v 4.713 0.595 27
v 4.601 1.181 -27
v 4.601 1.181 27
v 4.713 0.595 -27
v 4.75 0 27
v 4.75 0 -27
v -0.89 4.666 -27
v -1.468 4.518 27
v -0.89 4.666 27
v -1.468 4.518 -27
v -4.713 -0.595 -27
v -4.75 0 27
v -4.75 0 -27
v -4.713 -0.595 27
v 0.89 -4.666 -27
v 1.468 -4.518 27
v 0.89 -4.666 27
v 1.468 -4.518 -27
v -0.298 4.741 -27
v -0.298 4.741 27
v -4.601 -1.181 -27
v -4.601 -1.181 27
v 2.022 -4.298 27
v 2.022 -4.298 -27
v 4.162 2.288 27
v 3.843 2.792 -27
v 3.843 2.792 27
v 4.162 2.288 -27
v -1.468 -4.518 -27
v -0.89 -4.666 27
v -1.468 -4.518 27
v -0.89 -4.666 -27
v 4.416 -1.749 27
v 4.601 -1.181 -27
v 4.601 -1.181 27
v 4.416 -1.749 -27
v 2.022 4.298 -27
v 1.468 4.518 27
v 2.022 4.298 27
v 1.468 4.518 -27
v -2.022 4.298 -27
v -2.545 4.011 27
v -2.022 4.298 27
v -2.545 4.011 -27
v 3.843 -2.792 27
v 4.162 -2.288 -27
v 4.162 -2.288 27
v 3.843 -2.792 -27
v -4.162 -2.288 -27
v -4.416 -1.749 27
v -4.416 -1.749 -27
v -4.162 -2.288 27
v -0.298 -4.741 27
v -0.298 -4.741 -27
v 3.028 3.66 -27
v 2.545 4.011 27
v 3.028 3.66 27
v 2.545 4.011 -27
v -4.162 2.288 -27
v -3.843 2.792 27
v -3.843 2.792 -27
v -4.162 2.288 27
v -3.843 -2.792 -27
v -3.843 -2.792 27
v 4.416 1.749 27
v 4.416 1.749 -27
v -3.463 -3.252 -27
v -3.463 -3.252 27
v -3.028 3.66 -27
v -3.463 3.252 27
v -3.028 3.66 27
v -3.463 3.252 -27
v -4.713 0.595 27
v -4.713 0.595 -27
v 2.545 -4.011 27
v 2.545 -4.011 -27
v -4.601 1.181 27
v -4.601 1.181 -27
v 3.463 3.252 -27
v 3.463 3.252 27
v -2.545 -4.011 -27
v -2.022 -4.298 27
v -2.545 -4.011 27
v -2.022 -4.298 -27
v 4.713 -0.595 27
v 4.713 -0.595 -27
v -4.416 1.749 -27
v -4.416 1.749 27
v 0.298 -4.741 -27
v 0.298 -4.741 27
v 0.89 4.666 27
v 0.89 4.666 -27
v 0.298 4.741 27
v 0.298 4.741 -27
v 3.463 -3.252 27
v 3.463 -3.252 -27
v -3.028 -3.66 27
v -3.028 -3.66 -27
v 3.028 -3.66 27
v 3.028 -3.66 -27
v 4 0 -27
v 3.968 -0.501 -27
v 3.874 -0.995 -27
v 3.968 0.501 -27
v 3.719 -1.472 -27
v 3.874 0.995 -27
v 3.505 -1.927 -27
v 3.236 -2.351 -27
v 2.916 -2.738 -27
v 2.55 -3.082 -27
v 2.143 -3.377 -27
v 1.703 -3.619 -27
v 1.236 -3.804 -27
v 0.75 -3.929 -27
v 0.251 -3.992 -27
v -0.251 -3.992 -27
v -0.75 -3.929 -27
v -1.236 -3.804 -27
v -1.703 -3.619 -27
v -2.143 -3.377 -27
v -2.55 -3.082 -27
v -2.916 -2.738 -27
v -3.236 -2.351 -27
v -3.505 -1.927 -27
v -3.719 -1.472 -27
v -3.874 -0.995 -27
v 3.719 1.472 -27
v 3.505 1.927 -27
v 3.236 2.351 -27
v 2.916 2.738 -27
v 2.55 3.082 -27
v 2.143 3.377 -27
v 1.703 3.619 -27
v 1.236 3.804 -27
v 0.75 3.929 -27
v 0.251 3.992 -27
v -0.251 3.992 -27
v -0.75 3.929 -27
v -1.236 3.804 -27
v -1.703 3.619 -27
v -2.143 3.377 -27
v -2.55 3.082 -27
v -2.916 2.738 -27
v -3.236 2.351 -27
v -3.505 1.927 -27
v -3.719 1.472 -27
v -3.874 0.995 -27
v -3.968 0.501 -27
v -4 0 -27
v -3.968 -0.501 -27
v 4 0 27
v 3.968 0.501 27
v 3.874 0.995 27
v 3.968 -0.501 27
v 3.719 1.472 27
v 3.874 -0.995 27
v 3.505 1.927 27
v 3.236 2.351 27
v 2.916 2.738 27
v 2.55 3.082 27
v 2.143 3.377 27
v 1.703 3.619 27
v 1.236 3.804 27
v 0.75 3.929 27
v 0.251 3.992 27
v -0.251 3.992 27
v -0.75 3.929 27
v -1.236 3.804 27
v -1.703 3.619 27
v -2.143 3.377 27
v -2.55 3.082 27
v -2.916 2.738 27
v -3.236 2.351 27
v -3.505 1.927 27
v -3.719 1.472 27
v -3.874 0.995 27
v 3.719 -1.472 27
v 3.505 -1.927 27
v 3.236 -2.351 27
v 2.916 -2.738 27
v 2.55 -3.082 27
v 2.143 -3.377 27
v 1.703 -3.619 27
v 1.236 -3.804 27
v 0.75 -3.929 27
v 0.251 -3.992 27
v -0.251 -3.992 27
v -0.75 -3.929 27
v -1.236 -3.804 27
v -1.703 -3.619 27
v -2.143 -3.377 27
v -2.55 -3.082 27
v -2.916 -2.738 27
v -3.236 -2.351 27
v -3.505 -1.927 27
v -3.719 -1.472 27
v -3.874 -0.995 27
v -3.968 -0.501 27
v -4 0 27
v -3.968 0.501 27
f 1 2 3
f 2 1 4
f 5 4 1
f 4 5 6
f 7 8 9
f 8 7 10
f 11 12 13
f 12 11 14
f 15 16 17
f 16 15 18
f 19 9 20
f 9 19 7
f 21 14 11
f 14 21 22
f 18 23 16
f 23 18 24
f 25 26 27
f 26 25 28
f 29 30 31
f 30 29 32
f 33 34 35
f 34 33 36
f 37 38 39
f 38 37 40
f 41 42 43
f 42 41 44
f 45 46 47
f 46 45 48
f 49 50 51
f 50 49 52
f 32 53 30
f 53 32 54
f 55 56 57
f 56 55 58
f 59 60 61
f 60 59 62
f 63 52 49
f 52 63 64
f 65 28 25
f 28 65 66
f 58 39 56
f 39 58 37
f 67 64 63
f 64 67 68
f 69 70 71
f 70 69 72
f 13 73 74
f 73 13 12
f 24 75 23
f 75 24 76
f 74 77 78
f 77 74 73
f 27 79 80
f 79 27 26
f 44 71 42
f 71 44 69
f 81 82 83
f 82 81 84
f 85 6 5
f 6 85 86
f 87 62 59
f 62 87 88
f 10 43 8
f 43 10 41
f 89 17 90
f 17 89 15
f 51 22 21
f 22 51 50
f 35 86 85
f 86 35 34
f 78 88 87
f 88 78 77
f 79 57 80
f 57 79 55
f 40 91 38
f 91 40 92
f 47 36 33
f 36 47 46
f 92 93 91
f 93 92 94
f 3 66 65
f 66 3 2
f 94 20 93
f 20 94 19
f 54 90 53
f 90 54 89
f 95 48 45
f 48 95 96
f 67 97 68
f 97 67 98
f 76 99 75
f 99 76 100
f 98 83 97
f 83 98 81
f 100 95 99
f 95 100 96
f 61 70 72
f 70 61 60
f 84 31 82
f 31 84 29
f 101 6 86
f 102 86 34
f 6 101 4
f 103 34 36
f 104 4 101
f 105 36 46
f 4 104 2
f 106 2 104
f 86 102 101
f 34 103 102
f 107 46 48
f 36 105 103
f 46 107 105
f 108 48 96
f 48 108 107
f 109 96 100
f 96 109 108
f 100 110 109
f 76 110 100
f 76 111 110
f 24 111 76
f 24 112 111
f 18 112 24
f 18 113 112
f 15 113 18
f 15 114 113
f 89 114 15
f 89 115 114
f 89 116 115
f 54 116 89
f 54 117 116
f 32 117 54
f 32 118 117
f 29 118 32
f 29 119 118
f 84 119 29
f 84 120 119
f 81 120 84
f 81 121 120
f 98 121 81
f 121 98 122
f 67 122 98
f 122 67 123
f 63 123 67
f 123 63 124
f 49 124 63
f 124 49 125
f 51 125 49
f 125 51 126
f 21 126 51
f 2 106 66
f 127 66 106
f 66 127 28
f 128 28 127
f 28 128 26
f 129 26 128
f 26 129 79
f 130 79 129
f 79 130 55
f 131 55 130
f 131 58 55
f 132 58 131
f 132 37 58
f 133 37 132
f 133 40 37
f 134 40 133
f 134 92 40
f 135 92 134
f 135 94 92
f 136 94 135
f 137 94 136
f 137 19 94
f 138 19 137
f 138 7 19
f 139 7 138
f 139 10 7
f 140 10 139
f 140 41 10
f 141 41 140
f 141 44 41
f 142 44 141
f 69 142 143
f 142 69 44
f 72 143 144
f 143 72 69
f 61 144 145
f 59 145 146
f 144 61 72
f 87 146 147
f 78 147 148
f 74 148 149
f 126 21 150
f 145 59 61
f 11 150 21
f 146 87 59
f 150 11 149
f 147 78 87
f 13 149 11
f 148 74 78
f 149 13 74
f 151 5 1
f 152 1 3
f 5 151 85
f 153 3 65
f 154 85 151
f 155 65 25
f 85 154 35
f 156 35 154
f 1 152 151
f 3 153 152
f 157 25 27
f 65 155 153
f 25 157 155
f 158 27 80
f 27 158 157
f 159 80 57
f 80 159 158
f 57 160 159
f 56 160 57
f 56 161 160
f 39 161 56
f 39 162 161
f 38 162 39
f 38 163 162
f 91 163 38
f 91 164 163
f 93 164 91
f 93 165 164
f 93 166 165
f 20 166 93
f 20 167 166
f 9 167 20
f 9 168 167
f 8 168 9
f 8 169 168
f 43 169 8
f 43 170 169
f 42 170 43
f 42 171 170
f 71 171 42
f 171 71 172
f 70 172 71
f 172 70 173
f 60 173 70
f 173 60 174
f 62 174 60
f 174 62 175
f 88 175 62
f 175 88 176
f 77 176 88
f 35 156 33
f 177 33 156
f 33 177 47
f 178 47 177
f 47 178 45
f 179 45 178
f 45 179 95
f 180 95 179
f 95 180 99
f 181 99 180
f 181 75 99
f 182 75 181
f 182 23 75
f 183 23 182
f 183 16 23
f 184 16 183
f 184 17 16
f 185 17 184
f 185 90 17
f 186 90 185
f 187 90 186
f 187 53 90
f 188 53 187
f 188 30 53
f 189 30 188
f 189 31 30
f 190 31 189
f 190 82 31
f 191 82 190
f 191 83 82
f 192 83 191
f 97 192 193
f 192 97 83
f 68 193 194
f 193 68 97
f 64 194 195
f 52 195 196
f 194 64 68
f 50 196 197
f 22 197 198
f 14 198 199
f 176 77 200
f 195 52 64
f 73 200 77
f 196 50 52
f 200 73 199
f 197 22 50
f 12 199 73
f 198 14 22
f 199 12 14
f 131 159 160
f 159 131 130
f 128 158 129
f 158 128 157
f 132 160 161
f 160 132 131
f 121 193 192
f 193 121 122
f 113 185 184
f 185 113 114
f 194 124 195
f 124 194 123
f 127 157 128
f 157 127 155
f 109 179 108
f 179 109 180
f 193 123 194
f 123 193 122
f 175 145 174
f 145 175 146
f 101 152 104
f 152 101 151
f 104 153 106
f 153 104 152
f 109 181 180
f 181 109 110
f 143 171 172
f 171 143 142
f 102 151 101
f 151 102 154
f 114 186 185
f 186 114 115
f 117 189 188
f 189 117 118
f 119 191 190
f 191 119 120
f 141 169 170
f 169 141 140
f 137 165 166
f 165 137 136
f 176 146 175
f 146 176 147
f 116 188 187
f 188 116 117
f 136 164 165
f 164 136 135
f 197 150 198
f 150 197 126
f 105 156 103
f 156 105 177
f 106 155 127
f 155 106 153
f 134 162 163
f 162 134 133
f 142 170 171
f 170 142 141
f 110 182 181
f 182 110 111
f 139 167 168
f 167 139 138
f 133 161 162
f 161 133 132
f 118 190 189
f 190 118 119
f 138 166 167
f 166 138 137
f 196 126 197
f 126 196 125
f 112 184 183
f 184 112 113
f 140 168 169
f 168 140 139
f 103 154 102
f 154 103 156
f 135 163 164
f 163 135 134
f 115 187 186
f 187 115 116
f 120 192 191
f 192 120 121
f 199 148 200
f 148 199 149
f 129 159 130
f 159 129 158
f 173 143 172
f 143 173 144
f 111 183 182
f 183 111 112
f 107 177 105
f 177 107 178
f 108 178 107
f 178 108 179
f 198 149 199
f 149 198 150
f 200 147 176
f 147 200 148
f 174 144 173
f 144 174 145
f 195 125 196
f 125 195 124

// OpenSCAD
$fn = 50;


difference() {
	union() {
		translate(v = [0, 0, -27.0000000000]) {
			cylinder(h = 54, r = 4.7500000000);
		}
	}
	union() {
		translate(v = [0, 0, -100.0000000000]) {
			cylinder(h = 200, r = 4.0000000000);
		}
	}
}
